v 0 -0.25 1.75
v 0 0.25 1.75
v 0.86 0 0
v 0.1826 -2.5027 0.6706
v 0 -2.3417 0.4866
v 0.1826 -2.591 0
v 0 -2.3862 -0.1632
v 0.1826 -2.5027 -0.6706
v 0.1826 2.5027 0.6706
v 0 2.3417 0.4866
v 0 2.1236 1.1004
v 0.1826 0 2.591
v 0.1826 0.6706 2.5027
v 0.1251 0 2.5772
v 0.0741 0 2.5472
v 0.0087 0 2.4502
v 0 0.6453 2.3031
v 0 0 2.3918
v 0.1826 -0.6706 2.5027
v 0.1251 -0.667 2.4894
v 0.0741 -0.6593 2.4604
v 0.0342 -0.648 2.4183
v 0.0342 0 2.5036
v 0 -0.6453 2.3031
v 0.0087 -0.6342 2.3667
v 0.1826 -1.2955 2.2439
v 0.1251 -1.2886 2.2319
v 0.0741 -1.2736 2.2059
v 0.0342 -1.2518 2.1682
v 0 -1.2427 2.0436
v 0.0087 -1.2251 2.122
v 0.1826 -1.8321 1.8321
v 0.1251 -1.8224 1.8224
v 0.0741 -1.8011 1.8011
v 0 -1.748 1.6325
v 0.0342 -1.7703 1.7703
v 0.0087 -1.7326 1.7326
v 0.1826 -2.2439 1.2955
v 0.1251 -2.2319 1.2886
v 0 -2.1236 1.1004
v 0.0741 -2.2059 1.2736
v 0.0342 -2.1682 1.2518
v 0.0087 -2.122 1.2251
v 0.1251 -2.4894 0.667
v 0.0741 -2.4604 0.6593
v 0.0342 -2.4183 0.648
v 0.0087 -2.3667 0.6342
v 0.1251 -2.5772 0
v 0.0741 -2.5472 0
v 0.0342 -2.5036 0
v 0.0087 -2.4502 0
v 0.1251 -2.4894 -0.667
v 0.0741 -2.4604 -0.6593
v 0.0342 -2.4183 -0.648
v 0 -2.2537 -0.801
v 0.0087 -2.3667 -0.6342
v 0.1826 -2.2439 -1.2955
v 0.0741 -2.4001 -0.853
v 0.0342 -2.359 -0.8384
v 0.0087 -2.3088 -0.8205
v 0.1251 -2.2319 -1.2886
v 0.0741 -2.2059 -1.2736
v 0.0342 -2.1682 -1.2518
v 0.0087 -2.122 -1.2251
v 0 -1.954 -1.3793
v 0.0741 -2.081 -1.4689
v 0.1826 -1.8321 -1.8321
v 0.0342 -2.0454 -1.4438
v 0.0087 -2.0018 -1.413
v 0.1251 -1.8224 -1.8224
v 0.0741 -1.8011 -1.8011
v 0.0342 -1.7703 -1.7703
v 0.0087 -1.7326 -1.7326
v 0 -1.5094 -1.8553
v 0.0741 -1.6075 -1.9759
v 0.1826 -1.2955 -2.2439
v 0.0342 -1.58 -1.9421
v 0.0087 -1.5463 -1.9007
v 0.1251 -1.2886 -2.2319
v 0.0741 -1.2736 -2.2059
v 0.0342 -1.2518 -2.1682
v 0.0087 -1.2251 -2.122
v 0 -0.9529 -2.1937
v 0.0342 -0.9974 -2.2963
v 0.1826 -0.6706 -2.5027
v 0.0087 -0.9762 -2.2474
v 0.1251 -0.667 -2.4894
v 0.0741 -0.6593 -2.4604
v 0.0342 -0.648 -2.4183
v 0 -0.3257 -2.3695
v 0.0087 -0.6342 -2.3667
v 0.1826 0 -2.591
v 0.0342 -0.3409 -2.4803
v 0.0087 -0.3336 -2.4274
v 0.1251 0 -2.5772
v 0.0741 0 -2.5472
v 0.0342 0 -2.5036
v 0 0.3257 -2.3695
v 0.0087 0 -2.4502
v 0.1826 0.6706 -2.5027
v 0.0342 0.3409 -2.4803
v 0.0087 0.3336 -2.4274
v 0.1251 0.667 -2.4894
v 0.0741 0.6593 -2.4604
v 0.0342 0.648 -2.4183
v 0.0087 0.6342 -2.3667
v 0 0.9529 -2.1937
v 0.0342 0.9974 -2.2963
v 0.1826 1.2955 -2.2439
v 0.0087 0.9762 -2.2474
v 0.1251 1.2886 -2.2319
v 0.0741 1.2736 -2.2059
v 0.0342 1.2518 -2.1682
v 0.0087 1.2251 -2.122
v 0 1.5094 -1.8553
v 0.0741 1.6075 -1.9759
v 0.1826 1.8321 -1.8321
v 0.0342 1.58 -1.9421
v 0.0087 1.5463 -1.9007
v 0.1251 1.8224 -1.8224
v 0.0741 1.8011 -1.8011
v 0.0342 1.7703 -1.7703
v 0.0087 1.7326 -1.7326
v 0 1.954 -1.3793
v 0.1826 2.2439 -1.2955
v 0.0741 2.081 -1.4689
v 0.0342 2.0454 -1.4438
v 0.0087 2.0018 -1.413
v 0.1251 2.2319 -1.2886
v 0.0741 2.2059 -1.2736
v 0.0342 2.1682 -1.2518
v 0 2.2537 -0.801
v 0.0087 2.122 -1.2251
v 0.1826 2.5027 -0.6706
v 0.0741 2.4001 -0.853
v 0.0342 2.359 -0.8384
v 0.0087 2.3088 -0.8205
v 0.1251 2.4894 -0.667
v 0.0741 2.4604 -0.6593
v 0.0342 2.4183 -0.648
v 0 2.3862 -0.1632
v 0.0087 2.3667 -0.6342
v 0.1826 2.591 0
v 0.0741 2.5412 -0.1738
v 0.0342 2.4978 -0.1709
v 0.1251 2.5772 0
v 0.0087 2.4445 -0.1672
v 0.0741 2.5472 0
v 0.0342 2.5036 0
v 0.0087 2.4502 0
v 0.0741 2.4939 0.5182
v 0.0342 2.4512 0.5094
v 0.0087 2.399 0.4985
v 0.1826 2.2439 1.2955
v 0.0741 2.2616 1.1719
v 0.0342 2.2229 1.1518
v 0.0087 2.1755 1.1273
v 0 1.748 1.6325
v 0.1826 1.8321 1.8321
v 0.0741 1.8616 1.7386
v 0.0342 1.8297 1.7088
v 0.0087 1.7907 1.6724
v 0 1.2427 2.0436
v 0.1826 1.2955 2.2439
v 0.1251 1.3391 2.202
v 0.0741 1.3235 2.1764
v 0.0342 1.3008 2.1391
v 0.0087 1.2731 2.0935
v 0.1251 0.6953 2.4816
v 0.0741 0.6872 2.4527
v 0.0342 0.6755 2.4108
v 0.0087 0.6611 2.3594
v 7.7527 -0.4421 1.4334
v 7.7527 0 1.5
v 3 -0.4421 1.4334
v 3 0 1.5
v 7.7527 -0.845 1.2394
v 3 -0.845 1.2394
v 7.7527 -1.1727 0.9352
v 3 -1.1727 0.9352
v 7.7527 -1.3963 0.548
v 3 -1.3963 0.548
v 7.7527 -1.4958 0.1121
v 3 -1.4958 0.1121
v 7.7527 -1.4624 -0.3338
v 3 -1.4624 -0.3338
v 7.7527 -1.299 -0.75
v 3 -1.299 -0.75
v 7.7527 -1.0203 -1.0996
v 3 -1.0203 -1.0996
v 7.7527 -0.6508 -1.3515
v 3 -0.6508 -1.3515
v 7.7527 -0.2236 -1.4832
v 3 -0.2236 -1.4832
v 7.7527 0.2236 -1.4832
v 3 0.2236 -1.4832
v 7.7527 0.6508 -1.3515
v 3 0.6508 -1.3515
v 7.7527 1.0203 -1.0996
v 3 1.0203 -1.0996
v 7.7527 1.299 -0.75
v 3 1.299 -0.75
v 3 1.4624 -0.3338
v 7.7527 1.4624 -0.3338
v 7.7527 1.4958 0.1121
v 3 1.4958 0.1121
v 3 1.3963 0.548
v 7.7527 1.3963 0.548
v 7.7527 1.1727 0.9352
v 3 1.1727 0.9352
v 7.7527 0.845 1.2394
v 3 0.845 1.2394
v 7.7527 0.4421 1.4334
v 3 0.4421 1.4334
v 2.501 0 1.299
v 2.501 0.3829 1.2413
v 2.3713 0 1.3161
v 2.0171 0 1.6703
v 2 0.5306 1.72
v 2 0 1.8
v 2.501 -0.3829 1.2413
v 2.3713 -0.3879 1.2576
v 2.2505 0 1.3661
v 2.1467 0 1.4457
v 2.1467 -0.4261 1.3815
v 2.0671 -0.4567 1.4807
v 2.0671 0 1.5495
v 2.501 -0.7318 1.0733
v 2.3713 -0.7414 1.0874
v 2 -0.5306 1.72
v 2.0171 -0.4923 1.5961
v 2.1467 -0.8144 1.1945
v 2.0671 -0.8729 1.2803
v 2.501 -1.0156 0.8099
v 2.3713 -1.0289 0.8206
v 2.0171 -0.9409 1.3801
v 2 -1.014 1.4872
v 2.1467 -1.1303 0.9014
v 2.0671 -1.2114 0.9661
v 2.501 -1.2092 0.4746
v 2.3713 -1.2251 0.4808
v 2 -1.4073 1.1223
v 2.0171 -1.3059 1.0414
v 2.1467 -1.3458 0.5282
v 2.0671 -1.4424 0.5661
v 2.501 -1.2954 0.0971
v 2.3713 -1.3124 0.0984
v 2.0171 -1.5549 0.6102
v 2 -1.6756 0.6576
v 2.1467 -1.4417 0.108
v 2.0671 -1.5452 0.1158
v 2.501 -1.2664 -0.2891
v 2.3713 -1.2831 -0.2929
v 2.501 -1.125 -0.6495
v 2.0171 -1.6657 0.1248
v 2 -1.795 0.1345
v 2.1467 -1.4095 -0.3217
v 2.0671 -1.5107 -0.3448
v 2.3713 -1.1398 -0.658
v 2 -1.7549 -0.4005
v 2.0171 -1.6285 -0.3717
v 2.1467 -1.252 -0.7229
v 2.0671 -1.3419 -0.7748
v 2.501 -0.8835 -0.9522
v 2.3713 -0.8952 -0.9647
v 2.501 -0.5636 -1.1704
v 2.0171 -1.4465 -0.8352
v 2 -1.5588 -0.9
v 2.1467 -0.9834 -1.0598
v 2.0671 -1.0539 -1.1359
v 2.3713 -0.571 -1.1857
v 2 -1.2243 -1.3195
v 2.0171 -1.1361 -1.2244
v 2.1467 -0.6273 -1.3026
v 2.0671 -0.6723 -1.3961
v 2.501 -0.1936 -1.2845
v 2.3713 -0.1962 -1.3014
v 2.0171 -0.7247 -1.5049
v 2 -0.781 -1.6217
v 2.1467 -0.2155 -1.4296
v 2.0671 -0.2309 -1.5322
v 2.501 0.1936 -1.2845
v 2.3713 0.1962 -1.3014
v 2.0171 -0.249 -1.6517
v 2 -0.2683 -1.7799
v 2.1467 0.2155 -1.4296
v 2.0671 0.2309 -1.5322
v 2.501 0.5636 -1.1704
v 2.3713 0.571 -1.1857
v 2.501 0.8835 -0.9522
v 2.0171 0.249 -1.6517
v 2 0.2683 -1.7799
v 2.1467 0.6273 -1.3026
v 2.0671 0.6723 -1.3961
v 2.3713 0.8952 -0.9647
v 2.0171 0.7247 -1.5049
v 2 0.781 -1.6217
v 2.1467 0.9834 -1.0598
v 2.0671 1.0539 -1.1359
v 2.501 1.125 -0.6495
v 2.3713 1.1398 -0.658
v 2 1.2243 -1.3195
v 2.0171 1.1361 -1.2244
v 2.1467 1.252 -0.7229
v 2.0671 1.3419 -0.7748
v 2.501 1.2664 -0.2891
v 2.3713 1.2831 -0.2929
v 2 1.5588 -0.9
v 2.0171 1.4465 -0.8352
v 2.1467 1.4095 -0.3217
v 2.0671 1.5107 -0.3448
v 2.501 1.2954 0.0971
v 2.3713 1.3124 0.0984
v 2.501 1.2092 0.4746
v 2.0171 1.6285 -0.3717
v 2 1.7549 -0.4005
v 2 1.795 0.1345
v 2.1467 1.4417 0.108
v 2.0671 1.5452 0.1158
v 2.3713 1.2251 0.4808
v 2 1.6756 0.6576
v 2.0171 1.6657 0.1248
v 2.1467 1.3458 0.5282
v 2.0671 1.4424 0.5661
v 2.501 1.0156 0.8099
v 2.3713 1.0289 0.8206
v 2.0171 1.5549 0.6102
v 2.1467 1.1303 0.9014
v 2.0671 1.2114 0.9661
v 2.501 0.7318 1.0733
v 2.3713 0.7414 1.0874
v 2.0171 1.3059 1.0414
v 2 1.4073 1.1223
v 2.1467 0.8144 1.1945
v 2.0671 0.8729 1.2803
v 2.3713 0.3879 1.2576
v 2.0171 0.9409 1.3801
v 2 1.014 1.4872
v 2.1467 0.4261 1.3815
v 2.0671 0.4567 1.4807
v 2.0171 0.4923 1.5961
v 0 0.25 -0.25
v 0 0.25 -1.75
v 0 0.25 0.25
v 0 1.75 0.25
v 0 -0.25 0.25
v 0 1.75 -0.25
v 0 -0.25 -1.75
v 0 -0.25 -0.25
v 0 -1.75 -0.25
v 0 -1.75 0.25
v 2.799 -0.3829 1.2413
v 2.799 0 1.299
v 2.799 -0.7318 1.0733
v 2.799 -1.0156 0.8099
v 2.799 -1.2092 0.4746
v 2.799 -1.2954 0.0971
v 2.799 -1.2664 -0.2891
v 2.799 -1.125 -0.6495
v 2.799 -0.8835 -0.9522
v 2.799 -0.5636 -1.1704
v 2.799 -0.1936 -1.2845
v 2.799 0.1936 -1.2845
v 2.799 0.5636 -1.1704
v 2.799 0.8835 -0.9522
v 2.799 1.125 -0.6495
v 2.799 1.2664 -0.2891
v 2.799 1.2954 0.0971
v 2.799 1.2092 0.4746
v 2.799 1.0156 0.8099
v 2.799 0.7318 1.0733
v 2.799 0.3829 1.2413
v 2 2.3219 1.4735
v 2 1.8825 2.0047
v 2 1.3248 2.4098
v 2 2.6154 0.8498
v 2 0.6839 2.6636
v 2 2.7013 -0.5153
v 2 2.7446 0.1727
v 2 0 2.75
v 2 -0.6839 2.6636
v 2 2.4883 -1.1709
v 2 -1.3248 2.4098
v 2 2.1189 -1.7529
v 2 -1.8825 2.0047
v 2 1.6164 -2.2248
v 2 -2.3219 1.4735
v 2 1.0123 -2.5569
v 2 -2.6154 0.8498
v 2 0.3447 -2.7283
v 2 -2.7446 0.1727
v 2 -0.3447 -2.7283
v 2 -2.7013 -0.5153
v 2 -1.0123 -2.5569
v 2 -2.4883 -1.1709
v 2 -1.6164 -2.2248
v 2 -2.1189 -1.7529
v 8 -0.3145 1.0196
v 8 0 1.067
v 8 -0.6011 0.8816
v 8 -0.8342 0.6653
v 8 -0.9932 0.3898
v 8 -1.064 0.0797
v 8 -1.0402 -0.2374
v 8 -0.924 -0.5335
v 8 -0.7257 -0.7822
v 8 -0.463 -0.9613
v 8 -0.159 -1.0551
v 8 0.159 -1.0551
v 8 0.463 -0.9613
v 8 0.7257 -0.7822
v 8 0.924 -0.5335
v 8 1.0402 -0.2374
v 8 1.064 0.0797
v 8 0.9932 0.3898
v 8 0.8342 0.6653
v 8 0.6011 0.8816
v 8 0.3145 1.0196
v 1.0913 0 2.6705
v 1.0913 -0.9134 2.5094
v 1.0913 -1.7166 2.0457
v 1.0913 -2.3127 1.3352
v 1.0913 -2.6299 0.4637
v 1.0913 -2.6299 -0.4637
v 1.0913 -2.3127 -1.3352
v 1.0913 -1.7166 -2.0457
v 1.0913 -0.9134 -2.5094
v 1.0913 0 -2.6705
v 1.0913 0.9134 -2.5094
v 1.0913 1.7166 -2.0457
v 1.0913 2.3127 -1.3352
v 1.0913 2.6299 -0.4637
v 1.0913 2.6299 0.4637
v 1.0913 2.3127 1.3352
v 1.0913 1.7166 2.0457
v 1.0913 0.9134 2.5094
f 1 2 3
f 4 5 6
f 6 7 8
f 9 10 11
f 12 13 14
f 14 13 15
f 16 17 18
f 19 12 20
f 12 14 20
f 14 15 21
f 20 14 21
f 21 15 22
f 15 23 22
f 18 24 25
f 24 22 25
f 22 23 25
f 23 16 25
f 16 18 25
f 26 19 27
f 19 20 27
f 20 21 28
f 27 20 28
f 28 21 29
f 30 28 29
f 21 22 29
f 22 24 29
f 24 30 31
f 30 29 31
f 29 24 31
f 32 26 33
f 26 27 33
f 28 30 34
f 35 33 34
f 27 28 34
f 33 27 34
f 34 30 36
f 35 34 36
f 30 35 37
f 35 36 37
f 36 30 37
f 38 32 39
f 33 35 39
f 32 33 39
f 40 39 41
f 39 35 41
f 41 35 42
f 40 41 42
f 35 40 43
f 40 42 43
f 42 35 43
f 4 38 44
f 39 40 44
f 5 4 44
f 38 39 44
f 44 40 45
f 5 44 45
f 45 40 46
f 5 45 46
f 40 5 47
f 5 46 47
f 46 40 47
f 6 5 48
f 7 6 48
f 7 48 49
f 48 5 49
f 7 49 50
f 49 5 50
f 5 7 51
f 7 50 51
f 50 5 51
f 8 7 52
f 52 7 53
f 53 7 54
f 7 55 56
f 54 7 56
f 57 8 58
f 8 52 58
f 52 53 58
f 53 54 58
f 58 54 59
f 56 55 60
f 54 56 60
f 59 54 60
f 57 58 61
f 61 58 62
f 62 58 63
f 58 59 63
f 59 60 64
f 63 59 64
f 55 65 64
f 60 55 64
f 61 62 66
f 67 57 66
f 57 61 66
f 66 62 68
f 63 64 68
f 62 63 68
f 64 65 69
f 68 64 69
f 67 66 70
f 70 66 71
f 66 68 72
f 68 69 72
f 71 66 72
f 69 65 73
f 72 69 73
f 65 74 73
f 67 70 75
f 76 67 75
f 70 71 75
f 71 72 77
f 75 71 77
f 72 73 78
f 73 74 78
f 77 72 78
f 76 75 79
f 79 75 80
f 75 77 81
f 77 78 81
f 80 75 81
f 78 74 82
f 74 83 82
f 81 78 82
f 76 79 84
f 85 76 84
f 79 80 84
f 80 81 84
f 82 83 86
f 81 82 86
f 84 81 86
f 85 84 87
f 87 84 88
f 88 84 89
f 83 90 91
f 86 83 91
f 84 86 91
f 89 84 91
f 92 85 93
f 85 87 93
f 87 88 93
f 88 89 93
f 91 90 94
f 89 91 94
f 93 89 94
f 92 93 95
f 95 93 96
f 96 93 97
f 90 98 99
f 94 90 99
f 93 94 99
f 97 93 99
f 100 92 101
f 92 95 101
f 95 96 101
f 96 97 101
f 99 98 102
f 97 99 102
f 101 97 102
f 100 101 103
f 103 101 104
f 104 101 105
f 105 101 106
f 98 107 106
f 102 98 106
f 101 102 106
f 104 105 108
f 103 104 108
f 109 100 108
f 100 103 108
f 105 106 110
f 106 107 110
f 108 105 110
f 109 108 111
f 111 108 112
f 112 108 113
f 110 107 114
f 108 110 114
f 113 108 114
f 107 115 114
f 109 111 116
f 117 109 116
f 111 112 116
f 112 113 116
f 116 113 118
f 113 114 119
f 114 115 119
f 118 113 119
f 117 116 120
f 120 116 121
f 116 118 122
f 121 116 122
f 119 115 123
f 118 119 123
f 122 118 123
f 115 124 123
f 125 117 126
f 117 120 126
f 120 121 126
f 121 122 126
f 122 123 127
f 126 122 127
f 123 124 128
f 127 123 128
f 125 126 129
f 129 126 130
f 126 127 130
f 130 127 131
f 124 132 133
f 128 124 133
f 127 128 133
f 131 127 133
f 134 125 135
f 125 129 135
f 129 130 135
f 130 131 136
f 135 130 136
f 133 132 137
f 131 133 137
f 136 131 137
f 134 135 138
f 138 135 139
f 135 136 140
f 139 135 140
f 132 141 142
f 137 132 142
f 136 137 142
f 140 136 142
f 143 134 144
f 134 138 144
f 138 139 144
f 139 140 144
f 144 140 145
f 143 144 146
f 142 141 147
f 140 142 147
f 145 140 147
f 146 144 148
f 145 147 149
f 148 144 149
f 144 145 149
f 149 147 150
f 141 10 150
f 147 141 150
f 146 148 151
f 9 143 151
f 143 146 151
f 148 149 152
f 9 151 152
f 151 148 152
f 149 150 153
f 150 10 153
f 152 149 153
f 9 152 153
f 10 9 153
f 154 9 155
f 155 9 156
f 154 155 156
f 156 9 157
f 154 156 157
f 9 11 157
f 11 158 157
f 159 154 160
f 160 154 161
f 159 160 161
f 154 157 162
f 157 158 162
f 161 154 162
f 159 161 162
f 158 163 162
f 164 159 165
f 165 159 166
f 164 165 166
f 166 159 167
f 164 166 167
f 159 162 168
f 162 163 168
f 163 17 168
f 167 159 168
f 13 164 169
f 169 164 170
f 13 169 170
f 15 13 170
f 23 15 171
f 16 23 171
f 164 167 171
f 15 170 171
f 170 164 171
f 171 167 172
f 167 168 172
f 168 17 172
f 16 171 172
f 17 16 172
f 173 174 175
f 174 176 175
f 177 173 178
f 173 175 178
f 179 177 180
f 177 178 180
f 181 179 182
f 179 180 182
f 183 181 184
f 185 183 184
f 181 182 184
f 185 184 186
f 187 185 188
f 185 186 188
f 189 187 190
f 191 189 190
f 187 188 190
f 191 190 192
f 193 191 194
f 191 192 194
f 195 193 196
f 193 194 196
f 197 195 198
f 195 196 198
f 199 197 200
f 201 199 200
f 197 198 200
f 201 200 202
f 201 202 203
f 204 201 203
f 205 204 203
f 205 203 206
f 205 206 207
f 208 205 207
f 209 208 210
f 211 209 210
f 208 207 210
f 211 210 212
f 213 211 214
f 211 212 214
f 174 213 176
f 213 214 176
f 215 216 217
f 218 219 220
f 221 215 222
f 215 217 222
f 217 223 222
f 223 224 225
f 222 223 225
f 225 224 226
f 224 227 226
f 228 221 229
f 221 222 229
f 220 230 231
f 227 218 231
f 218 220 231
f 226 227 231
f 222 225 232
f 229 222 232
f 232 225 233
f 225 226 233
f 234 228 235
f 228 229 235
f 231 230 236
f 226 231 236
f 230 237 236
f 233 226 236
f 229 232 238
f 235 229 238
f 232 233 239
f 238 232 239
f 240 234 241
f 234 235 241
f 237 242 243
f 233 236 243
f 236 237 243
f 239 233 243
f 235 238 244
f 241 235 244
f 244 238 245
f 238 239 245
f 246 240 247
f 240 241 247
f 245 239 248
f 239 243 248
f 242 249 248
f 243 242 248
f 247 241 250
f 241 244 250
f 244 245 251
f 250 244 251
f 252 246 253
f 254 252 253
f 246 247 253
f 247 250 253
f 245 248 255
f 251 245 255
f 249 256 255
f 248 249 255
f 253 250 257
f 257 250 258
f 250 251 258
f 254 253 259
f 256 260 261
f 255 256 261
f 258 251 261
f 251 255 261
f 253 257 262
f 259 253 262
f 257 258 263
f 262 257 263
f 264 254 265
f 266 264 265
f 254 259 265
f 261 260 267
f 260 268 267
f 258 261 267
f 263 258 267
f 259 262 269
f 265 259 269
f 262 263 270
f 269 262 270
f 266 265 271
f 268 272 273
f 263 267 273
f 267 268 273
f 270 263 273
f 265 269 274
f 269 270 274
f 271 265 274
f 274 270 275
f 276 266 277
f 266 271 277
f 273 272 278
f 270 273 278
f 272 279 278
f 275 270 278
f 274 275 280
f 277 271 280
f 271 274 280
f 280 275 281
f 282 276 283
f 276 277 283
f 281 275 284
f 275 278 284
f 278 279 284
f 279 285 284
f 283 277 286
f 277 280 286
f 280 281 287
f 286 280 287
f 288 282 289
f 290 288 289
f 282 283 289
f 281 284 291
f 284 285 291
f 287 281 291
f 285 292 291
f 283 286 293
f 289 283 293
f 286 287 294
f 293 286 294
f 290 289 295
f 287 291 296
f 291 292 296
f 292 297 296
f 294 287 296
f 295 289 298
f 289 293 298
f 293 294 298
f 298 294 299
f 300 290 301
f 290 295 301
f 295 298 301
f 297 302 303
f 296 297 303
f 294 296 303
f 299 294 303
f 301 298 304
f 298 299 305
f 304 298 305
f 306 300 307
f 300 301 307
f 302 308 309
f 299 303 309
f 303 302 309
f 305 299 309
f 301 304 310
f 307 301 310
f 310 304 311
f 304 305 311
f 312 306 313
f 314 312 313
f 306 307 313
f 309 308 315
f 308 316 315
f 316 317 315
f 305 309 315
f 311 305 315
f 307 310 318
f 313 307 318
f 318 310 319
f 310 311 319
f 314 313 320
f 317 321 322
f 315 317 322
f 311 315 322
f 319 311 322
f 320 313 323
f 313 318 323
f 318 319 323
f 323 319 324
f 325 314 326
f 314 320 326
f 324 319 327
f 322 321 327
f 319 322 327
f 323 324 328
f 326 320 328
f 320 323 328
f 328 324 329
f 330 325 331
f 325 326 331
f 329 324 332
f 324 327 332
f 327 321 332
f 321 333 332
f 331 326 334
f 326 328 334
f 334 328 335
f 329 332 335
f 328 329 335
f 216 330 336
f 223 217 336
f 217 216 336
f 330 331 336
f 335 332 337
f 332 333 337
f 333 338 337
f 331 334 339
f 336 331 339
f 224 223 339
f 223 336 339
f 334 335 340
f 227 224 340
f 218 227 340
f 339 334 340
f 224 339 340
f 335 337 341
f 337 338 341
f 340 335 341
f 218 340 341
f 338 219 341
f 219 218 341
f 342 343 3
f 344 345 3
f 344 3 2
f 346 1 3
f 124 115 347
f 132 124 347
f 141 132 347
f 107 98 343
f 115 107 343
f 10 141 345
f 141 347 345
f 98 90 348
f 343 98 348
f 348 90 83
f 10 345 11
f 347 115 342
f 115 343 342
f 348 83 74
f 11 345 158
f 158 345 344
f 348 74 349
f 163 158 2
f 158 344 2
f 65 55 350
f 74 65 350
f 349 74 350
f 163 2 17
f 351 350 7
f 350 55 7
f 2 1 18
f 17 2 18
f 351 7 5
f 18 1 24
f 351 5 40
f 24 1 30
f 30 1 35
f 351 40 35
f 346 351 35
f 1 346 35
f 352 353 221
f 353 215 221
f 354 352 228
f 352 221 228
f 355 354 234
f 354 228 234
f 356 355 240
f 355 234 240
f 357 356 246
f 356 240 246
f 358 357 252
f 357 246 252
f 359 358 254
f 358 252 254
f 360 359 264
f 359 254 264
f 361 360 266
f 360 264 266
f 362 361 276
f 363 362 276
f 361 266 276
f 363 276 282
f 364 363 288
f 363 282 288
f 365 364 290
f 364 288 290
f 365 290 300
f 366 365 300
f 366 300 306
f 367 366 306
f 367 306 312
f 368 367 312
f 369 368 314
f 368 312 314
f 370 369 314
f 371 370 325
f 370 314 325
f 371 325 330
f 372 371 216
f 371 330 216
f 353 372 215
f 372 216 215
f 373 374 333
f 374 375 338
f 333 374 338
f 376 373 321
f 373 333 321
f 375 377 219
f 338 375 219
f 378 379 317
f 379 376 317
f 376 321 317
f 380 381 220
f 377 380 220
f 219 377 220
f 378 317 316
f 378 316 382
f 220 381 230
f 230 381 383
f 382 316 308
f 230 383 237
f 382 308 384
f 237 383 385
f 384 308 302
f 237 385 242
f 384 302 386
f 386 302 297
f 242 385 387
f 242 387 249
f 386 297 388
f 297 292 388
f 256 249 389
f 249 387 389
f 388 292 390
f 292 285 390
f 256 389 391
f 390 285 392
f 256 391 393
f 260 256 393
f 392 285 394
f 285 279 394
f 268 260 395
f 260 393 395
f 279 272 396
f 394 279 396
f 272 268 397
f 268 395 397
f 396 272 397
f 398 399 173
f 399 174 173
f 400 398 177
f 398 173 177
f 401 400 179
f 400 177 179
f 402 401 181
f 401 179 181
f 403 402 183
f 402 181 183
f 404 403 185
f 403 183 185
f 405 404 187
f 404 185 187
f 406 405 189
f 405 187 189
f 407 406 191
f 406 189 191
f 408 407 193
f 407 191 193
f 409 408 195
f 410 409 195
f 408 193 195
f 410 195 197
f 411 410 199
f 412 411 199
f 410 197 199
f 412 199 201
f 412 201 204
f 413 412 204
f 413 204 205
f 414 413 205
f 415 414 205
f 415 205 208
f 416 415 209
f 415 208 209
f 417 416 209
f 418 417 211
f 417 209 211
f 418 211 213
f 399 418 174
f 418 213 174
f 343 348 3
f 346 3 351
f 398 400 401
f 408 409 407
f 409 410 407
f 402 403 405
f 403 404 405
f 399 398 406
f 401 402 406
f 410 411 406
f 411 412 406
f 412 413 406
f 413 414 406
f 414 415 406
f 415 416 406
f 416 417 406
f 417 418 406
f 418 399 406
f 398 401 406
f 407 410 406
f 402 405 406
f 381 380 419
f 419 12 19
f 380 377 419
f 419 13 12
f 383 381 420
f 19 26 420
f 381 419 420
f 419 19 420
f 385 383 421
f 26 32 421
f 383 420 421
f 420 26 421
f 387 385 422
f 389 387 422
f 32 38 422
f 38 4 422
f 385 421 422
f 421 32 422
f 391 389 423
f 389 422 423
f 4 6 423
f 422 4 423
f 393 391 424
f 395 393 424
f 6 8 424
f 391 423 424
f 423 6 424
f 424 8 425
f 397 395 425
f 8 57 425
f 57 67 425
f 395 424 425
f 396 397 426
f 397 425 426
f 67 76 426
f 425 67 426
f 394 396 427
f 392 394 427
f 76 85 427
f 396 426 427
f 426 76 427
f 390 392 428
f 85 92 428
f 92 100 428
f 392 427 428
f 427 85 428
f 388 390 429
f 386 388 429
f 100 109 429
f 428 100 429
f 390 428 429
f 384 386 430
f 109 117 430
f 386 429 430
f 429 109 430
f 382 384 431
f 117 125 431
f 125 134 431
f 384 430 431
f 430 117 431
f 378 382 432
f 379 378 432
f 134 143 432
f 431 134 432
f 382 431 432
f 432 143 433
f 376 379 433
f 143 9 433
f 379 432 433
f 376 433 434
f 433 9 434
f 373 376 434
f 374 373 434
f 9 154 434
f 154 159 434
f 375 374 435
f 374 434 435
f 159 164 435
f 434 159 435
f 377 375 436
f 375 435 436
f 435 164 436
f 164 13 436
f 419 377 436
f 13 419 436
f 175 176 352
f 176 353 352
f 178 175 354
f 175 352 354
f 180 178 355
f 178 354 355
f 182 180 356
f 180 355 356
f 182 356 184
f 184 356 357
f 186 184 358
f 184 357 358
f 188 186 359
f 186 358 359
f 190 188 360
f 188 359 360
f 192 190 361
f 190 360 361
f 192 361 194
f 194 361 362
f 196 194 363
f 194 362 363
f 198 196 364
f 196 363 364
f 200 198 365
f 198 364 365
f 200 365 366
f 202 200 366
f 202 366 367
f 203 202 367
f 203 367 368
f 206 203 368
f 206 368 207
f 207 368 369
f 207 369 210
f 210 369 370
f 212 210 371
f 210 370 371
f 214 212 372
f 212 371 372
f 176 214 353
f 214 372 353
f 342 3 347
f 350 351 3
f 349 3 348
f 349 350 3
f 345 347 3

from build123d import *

# Parameters (mm, degrees)
PATTERN_CIRCULAR_1_COUNT = 2
PATTERN_CIRCULAR_1_ANGLE = 90


with BuildPart() as part:
    # 草图3 → Revolve 850 (revolve)
    with BuildSketch(Plane.XY, mode=Mode.PRIVATE) as revolve_850_sk:
        with BuildLine():
            Line((0, 0), (8, 0))
            Line((8, 0), (8, 1.5))
            Line((8, 1.5), (3, 1.5))
            Line((3, 1.5), (2.799, 1.299))
            Line((2.799, 1.299), (2.501, 1.299))
            ThreePointArc((2.501, 1.299), (2.146739503, 1.445739503), (2, 1.8))
            Line((2, 1.8), (2, 2.75))
            Line((2, 2.75), (0.182568851, 2.590995378))
            ThreePointArc((0.182568851, 2.590995378), (0.052544533, 2.52687448), (0, 2.391756438))
            Line((0, 2.391756438), (0, 0))
        make_face()
    revolve(revolve_850_sk.sketch.rotate(Axis((-2.16958059, 0, 0), (1, 0, 0)), 90), axis=Axis((-2.16958059, 0, 0), (1, 0, 0)))

    # 草图4 → 切除-旋转1 (revolve, cut)
    with BuildSketch(Plane.XY, mode=Mode.PRIVATE) as cut_revolve_1_sk:
        Polygon((7.752708003, 1.5), (8.252708003, 1.5), (8, 1.067), align=None)
    revolve(cut_revolve_1_sk.sketch.rotate(Axis((-0.21798541, 0, 0), (1, 0, 0)), 90), axis=Axis((-0.21798541, 0, 0), (1, 0, 0)), mode=Mode.SUBTRACT)

    # 草图5 → 切除-放样1 section 0
    with BuildSketch(Plane.ZY, mode=Mode.PRIVATE) as loft_1_s0:
        with BuildLine():
            Line((-0.25, 1.75), (0.25, 1.75))
            Line((0.25, 1.75), (0.25, -1.75))
            Line((0.25, -1.75), (-0.25, -1.75))
            Line((-0.25, -1.75), (-0.25, 1.75))
        make_face()
    loft_1 = loft([loft_1_s0.sketch, Vertex(0.86, 0, 0)], mode=Mode.SUBTRACT)

    # 阵列(圆周)1: 切除-放样1 ×2 about axis
    pattern_circular_1_axis = Axis((0, 0, 0), (1, 0, 0))
    for i in range(1, PATTERN_CIRCULAR_1_COUNT):
        add(loft_1.rotate(pattern_circular_1_axis, i * PATTERN_CIRCULAR_1_ANGLE / (PATTERN_CIRCULAR_1_COUNT - 1)), mode=Mode.SUBTRACT)


solid = part.part
